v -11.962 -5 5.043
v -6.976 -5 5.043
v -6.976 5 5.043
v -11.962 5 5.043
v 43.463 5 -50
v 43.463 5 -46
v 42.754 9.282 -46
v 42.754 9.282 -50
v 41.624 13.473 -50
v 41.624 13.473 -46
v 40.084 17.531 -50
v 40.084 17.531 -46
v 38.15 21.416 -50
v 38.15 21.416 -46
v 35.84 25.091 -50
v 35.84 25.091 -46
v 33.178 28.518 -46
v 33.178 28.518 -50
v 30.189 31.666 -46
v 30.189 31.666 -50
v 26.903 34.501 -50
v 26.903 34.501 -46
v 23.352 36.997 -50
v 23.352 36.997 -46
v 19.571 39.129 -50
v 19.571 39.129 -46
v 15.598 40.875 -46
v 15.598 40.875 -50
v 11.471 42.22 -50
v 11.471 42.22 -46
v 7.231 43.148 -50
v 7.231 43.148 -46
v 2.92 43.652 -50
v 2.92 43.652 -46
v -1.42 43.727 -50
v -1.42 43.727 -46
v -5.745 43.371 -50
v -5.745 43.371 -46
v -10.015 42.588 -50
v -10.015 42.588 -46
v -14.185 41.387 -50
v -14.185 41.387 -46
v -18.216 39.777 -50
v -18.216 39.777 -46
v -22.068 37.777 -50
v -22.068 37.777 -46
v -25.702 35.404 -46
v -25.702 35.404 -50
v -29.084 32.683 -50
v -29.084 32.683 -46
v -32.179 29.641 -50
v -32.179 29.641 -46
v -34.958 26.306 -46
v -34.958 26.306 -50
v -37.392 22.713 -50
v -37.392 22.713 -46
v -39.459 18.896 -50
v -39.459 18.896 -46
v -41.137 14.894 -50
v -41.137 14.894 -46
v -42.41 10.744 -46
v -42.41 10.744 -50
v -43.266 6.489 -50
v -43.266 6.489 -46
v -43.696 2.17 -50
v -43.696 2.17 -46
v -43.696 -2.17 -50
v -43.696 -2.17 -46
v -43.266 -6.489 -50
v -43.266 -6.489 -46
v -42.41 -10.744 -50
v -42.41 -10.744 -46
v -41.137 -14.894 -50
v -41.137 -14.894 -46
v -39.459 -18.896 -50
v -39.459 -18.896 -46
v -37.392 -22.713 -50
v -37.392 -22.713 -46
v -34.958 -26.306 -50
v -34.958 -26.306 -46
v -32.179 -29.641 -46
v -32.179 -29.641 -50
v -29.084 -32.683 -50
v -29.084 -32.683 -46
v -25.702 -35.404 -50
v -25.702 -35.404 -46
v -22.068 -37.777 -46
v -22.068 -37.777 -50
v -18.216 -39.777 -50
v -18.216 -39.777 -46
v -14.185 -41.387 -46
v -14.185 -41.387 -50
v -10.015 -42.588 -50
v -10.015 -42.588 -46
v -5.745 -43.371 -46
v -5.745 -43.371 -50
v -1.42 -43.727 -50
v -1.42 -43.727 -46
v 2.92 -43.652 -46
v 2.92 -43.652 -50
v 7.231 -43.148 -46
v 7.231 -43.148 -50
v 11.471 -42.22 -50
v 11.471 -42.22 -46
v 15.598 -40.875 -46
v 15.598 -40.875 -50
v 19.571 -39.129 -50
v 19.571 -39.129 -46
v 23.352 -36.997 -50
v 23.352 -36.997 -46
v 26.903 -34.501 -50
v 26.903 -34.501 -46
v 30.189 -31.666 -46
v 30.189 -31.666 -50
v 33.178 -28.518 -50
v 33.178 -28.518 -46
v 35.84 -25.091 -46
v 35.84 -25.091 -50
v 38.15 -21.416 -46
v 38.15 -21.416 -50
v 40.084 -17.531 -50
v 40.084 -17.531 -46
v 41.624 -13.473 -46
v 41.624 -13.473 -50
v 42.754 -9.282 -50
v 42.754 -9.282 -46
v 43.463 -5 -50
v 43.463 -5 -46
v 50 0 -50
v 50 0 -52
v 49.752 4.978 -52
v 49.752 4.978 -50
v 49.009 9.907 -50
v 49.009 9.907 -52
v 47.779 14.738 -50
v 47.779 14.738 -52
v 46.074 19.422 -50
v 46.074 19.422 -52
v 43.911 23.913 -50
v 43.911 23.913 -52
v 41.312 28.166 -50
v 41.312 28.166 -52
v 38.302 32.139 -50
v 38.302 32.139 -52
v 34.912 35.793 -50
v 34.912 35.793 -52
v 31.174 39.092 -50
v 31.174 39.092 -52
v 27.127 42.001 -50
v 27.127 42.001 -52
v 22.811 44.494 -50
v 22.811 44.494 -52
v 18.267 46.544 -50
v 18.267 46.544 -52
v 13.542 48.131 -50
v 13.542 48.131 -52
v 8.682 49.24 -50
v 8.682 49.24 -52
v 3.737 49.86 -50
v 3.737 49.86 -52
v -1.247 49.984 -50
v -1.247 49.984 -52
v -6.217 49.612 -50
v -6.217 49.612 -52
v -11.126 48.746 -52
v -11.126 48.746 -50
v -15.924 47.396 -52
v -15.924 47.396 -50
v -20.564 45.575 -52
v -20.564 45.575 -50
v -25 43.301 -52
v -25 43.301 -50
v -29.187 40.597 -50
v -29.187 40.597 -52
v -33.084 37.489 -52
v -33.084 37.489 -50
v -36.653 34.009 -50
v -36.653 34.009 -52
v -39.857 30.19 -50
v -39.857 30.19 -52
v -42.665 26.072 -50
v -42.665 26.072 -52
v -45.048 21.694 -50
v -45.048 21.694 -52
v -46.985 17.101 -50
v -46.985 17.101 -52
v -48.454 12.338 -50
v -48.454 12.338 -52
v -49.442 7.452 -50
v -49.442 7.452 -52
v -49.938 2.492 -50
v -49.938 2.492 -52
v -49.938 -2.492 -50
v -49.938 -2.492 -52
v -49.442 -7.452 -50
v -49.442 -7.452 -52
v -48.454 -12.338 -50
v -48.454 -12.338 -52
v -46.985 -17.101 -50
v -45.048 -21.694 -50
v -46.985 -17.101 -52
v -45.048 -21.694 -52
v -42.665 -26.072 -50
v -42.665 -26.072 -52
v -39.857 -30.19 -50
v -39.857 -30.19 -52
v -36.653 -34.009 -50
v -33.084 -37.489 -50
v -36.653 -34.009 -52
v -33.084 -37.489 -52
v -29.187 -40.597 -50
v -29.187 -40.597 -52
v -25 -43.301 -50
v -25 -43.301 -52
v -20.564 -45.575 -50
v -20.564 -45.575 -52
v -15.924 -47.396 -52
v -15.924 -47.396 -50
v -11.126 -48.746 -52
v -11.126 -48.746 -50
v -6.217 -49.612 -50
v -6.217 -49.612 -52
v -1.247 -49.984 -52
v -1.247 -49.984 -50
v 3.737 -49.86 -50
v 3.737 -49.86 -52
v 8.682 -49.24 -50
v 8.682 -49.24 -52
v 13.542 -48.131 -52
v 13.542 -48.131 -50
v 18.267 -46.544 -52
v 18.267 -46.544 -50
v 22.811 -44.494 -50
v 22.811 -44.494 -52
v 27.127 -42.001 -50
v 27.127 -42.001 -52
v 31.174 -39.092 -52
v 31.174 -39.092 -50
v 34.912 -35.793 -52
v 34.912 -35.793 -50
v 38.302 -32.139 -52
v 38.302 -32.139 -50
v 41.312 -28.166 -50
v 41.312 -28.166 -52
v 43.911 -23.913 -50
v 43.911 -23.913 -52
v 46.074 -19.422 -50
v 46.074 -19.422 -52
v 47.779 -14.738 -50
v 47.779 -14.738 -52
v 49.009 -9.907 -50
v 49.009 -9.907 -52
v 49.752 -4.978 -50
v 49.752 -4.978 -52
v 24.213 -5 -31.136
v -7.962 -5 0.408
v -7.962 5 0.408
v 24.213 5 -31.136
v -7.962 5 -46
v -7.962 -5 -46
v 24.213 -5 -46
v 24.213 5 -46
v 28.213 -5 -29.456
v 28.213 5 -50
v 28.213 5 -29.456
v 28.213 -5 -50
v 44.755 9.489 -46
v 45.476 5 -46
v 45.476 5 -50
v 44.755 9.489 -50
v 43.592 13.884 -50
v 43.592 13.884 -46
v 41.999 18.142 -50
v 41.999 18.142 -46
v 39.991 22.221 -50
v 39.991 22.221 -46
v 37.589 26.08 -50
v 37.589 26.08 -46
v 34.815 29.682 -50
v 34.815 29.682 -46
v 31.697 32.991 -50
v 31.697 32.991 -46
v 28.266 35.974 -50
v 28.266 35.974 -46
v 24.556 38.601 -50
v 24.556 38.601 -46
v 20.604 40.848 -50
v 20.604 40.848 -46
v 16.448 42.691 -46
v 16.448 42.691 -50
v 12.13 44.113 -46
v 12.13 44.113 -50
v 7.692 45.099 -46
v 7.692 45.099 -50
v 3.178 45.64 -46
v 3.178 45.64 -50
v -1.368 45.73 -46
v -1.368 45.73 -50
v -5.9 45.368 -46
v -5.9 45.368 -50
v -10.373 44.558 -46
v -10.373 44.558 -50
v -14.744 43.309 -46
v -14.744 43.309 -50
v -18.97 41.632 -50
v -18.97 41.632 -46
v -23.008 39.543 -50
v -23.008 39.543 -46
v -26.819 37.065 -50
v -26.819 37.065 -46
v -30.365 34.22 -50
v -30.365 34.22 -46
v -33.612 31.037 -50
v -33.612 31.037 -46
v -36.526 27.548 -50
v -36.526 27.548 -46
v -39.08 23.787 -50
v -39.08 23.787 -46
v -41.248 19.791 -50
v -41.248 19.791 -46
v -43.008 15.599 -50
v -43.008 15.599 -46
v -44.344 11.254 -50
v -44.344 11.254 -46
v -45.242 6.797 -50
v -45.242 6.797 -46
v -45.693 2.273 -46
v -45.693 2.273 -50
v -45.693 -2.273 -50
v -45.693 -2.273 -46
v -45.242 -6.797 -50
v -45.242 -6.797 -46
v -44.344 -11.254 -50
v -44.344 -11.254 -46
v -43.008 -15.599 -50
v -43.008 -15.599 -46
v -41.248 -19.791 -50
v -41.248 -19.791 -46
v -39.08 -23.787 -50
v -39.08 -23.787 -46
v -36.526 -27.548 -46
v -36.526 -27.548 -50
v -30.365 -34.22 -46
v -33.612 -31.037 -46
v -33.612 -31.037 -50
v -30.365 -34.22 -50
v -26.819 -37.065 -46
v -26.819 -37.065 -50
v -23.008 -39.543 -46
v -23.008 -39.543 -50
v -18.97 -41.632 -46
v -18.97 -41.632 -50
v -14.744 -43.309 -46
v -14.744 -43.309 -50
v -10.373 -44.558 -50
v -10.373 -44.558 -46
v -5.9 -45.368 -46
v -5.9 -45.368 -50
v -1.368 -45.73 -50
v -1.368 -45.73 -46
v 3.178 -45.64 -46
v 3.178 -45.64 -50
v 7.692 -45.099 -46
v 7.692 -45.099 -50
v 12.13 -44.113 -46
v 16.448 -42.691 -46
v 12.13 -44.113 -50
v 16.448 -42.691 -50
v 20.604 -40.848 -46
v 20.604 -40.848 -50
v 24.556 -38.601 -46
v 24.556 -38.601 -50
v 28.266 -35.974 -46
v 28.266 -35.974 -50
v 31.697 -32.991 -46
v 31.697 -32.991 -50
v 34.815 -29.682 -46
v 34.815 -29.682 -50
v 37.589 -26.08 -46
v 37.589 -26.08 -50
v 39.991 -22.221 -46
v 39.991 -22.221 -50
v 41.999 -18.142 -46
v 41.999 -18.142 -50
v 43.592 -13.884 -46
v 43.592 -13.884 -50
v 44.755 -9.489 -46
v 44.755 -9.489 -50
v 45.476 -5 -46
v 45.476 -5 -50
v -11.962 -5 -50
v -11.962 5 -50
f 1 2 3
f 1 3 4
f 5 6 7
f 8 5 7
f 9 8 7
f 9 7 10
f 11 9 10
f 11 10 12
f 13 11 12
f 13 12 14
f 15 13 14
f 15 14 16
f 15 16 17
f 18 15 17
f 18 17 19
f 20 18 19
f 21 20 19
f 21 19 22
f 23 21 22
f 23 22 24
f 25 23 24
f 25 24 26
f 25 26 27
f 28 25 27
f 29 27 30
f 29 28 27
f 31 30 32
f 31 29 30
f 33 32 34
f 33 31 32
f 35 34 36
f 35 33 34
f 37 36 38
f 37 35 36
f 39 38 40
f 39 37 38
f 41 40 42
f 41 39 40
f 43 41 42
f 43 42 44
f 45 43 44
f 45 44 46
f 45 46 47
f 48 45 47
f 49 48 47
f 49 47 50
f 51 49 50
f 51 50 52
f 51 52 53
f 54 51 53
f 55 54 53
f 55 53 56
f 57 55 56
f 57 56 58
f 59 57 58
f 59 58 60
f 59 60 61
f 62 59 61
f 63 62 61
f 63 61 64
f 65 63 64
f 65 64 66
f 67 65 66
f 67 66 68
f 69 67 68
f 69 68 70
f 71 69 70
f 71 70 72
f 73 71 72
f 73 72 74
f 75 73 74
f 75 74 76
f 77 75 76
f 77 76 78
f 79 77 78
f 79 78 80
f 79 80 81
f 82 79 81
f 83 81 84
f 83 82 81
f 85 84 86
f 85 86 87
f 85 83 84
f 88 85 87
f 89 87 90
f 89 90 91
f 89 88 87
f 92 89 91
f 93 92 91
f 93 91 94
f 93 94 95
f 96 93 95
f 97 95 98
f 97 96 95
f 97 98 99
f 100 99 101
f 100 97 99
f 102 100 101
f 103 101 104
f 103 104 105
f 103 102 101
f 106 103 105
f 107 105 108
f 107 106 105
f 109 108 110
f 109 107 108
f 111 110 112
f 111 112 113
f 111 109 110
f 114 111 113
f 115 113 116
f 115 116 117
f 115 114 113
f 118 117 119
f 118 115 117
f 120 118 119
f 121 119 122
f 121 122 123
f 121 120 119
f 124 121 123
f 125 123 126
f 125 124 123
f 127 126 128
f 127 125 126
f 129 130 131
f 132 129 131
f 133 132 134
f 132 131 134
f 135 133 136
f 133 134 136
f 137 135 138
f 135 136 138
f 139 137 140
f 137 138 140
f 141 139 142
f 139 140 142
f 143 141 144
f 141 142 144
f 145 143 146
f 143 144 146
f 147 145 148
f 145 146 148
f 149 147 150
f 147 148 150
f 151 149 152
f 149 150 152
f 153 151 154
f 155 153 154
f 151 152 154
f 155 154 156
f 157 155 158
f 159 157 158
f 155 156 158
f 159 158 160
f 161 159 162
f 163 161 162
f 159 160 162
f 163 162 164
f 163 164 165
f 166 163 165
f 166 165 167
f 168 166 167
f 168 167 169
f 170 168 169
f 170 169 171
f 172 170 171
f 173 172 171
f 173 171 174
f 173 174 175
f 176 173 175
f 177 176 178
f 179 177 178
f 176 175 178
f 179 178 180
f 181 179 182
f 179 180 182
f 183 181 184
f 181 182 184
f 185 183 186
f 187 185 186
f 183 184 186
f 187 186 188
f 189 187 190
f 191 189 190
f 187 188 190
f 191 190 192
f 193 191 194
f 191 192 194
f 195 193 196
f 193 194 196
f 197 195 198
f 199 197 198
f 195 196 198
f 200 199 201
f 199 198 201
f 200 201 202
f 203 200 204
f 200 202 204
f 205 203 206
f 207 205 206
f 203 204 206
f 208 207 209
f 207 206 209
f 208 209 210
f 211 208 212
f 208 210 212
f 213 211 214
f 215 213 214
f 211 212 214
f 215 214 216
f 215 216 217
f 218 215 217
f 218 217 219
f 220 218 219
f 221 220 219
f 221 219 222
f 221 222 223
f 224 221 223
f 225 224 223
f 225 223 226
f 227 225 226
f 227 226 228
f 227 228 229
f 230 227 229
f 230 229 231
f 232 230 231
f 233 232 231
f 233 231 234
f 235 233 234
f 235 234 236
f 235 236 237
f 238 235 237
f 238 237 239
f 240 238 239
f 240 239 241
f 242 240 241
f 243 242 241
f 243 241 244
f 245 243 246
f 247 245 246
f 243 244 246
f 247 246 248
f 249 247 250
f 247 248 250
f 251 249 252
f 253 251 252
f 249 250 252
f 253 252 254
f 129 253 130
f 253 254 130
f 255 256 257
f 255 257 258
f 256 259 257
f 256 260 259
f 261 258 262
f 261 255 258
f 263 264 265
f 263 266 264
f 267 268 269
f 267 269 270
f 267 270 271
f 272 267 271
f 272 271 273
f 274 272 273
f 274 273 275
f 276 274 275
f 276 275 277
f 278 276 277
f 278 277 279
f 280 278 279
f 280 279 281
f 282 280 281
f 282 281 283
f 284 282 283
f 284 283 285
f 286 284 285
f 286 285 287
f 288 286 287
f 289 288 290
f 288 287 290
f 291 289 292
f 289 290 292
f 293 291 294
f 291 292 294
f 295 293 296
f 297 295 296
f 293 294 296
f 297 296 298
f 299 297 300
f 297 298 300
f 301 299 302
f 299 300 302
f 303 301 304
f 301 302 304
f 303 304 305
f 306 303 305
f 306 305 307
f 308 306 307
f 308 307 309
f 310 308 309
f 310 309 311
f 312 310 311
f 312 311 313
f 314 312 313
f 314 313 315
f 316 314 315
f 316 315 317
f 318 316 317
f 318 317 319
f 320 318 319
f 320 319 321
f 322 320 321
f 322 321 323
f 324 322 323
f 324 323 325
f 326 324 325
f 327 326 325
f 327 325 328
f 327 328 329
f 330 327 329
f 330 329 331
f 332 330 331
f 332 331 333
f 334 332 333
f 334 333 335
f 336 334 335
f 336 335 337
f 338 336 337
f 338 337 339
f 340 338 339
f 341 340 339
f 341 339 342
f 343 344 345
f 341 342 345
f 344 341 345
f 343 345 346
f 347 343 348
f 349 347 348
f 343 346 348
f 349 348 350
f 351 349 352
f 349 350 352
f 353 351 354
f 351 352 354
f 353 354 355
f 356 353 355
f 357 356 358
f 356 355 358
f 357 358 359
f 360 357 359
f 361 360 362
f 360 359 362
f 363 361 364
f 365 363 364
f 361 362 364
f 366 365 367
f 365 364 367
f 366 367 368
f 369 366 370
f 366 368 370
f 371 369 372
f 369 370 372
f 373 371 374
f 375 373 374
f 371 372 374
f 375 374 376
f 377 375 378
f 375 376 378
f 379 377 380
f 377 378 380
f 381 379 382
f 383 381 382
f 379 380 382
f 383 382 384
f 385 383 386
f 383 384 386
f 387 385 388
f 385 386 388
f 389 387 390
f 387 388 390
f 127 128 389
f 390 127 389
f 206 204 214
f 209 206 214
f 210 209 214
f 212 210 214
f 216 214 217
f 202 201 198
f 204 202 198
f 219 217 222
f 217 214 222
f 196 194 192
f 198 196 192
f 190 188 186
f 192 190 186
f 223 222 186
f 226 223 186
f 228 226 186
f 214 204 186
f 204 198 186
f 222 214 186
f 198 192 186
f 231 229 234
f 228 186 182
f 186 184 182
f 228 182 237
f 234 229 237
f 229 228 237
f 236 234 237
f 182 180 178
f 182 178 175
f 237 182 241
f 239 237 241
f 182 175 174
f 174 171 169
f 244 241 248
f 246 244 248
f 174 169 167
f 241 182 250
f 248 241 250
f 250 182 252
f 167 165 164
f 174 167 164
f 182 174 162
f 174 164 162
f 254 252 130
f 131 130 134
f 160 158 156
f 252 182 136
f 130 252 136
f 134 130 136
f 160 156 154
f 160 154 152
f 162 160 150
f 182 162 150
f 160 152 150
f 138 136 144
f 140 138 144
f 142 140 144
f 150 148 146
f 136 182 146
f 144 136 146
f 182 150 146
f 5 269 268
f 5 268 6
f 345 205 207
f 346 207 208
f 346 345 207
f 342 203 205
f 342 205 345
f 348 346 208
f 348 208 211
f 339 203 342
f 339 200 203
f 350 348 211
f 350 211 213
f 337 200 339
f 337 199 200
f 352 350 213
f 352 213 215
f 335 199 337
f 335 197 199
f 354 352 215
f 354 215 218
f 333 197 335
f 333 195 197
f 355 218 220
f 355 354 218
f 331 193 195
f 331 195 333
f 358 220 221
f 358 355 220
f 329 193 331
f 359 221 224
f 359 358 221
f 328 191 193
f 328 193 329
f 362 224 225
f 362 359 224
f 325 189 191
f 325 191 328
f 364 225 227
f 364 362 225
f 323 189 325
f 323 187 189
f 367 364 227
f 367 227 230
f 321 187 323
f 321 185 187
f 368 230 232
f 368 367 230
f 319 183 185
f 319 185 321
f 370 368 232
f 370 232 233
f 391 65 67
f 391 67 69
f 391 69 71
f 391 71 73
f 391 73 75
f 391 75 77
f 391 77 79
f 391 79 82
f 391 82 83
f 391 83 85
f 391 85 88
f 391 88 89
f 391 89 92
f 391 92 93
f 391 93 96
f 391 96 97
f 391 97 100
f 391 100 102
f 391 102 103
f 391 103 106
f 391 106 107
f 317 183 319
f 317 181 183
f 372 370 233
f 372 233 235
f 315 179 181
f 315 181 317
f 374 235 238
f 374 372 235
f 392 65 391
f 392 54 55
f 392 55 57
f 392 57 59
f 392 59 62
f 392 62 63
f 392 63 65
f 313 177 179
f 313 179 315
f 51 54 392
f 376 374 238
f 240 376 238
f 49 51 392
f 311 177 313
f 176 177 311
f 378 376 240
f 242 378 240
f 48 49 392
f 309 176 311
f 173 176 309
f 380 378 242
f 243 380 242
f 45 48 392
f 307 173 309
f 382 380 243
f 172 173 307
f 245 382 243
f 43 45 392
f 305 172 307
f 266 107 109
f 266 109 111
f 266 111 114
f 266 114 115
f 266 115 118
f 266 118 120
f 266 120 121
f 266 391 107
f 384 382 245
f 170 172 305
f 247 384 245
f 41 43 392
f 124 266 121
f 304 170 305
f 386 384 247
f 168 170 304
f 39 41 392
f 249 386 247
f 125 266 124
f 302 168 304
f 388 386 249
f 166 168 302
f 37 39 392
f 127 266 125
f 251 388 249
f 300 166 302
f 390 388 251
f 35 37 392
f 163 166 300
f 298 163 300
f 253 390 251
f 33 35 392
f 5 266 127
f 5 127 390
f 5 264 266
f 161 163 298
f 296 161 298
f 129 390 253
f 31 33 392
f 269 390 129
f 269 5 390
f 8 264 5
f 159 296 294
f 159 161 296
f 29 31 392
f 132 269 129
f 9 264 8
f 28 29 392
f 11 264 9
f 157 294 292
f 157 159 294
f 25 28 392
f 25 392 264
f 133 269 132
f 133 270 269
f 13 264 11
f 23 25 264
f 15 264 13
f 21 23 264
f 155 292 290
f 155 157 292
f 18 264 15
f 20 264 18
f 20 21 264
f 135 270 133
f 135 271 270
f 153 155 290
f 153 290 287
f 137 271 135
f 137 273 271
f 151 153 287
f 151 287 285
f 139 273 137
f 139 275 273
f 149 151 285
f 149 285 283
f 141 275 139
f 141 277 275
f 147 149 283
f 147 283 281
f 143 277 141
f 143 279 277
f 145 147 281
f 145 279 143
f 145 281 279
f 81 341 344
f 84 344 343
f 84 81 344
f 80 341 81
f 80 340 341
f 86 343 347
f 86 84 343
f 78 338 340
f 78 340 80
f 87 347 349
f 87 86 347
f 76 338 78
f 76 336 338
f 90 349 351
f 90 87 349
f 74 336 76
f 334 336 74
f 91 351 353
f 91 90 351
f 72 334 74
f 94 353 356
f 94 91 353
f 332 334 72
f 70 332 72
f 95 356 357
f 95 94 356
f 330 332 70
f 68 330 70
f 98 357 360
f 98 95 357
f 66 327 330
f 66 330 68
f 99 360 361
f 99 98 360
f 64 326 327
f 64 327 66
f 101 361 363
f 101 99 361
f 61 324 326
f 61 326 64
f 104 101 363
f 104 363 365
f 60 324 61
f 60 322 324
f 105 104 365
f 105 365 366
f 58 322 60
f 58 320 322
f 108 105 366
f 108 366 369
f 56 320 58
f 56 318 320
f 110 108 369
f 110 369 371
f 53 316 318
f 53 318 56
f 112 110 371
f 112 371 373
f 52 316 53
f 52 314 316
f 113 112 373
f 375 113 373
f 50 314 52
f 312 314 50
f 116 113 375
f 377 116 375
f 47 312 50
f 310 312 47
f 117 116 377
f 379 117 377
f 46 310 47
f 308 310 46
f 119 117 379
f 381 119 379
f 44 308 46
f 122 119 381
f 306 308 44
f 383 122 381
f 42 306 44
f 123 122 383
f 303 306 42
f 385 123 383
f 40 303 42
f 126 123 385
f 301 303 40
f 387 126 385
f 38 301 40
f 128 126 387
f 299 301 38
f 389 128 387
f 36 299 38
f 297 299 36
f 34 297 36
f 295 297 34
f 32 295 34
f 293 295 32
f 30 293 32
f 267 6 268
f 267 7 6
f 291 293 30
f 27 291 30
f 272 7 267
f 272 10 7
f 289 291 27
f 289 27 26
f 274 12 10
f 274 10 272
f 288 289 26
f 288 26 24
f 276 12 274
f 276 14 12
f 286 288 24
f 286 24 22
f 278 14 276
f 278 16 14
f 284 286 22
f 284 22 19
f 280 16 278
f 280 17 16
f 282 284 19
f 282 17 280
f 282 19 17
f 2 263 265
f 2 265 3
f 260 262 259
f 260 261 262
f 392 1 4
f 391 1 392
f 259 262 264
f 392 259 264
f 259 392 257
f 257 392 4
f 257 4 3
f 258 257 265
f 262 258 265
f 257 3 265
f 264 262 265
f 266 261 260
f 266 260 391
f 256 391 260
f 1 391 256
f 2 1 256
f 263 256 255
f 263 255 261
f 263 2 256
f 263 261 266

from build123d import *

# Parameters (mm, degrees)
SKETCH026_R     = 50
PAD008_DEPTH    = 2
SKETCH027_R     = 45.75
SKETCH027_R_2   = 43.75
PAD009_DEPTH    = 4
POCKET012_DEPTH = 4
PAD010_DEPTH    = 5


with BuildPart() as part:
    # Sketch026 → Pad008 (new body)
    with BuildSketch(Plane.XY.offset(-52)):
        Circle(SKETCH026_R)
    extrude(amount=PAD008_DEPTH)

    # Sketch027 (on Face3 of Pad008) → Pad009 (join)
    with BuildSketch(Plane.XY.offset(-50)):
        Circle(SKETCH027_R)
        Circle(SKETCH027_R_2, mode=Mode.SUBTRACT)
    extrude(amount=PAD009_DEPTH)

    # Sketch029 (on Face5 of Pad009) → Pocket012 (cut)
    with BuildSketch(Plane.XY.offset(-46)):
        Polygon((46.84259, 0), (46.84259, 5), (41.84259, 5), (41.84259, 0), (41.84259, -5), (46.84259, -5), align=None)
    extrude(amount=-POCKET012_DEPTH, mode=Mode.SUBTRACT)

    # Sketch030 → Pad010 (join, symmetric)
    with BuildSketch(Plane.XZ):
        Polygon((28.213385, -50), (28.213385, -29.455622), (-6.976082, 5.043167), (-11.961835, 5.043167), (-11.961835, -50), align=None)
        Polygon((-7.961835, 0.407958), (24.213385, -31.135746), (24.213385, -46), (-7.961835, -46), align=None, mode=Mode.SUBTRACT)
    extrude(amount=PAD010_DEPTH, both=True)


solid = part.part
